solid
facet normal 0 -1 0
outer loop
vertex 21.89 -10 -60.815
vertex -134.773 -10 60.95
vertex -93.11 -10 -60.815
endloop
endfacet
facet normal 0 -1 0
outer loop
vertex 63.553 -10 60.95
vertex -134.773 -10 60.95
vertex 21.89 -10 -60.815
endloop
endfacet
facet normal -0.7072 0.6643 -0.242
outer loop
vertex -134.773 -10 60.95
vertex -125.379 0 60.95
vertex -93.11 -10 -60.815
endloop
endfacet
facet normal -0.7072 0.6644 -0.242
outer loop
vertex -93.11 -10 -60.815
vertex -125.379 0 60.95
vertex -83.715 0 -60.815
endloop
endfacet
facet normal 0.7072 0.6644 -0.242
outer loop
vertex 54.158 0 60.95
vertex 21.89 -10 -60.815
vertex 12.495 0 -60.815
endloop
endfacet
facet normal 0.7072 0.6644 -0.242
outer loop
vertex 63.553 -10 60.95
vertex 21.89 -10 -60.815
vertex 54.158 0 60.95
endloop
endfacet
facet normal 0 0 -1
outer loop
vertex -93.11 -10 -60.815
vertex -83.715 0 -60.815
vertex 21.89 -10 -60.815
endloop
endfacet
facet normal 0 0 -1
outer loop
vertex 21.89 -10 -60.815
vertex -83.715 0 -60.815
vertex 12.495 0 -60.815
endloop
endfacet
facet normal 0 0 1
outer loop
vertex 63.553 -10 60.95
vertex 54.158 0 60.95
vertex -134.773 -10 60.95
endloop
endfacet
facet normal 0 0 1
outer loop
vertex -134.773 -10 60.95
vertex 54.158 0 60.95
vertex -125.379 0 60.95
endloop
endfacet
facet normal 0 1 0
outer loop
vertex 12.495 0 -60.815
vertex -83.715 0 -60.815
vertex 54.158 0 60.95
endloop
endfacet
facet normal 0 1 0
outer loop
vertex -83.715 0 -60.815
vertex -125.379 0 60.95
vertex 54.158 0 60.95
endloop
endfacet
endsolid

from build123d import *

# Parameters (mm, degrees)
F0_W     = 115
F0_H     = 121.7650999273
F1_DEPTH = 10
F2_SIZE2 = 8.888878
F2_SIZE  = 9.99999
F3_SIZE2 = 9.99999
F3_SIZE  = 8.888878


# Not quite as in the source:
# - a fillet or chamfer is up to 0.001 mm smaller than in the source, because OpenCascade refuses the exact size


with BuildPart() as f1:
    # F0 (on Front) → F1 (new body)
    with BuildSketch(Plane.XZ):
        with Locations((-35.6102311611, 0.0679380756)):
            Rectangle(F0_W, F0_H)
        Polygon((-93.1102311611, -60.814611888), (-93.1102311611, 60.9504880392), (-134.7733613184, 60.9504880392), align=None)
        Polygon((63.5528989962, 60.9504880392), (21.8897688389, 60.9504880392), (21.8897688389, -60.814611888), align=None)
    extrude(amount=F1_DEPTH)

    # F2 (size 10 and 8.888888 in the source; OpenCascade refuses exactly that, so slightly less here)
    f2_edges = [f1.edges().sort_by_distance(p)[0] for p in [
        (-113.941796, 0, 0.067938),
    ]]
    f2_side = f1.faces().sort_by_distance((-113.941796, -5, 0.067938))[0]
    chamfer(f2_edges, length=F2_SIZE, length2=F2_SIZE2, reference=f2_side)

    # F3 (size 8.888888 and 10 in the source; OpenCascade refuses exactly that, so slightly less here)
    f3_edges = [f1.edges().sort_by_distance(p)[0] for p in [
        (42.721334, 0, 0.067938),
    ]]
    f3_side = f1.faces().sort_by_distance((-30.912828, 0, 5.809289))[0]
    chamfer(f3_edges, length=F3_SIZE, length2=F3_SIZE2, reference=f3_side)


solid = f1.part
